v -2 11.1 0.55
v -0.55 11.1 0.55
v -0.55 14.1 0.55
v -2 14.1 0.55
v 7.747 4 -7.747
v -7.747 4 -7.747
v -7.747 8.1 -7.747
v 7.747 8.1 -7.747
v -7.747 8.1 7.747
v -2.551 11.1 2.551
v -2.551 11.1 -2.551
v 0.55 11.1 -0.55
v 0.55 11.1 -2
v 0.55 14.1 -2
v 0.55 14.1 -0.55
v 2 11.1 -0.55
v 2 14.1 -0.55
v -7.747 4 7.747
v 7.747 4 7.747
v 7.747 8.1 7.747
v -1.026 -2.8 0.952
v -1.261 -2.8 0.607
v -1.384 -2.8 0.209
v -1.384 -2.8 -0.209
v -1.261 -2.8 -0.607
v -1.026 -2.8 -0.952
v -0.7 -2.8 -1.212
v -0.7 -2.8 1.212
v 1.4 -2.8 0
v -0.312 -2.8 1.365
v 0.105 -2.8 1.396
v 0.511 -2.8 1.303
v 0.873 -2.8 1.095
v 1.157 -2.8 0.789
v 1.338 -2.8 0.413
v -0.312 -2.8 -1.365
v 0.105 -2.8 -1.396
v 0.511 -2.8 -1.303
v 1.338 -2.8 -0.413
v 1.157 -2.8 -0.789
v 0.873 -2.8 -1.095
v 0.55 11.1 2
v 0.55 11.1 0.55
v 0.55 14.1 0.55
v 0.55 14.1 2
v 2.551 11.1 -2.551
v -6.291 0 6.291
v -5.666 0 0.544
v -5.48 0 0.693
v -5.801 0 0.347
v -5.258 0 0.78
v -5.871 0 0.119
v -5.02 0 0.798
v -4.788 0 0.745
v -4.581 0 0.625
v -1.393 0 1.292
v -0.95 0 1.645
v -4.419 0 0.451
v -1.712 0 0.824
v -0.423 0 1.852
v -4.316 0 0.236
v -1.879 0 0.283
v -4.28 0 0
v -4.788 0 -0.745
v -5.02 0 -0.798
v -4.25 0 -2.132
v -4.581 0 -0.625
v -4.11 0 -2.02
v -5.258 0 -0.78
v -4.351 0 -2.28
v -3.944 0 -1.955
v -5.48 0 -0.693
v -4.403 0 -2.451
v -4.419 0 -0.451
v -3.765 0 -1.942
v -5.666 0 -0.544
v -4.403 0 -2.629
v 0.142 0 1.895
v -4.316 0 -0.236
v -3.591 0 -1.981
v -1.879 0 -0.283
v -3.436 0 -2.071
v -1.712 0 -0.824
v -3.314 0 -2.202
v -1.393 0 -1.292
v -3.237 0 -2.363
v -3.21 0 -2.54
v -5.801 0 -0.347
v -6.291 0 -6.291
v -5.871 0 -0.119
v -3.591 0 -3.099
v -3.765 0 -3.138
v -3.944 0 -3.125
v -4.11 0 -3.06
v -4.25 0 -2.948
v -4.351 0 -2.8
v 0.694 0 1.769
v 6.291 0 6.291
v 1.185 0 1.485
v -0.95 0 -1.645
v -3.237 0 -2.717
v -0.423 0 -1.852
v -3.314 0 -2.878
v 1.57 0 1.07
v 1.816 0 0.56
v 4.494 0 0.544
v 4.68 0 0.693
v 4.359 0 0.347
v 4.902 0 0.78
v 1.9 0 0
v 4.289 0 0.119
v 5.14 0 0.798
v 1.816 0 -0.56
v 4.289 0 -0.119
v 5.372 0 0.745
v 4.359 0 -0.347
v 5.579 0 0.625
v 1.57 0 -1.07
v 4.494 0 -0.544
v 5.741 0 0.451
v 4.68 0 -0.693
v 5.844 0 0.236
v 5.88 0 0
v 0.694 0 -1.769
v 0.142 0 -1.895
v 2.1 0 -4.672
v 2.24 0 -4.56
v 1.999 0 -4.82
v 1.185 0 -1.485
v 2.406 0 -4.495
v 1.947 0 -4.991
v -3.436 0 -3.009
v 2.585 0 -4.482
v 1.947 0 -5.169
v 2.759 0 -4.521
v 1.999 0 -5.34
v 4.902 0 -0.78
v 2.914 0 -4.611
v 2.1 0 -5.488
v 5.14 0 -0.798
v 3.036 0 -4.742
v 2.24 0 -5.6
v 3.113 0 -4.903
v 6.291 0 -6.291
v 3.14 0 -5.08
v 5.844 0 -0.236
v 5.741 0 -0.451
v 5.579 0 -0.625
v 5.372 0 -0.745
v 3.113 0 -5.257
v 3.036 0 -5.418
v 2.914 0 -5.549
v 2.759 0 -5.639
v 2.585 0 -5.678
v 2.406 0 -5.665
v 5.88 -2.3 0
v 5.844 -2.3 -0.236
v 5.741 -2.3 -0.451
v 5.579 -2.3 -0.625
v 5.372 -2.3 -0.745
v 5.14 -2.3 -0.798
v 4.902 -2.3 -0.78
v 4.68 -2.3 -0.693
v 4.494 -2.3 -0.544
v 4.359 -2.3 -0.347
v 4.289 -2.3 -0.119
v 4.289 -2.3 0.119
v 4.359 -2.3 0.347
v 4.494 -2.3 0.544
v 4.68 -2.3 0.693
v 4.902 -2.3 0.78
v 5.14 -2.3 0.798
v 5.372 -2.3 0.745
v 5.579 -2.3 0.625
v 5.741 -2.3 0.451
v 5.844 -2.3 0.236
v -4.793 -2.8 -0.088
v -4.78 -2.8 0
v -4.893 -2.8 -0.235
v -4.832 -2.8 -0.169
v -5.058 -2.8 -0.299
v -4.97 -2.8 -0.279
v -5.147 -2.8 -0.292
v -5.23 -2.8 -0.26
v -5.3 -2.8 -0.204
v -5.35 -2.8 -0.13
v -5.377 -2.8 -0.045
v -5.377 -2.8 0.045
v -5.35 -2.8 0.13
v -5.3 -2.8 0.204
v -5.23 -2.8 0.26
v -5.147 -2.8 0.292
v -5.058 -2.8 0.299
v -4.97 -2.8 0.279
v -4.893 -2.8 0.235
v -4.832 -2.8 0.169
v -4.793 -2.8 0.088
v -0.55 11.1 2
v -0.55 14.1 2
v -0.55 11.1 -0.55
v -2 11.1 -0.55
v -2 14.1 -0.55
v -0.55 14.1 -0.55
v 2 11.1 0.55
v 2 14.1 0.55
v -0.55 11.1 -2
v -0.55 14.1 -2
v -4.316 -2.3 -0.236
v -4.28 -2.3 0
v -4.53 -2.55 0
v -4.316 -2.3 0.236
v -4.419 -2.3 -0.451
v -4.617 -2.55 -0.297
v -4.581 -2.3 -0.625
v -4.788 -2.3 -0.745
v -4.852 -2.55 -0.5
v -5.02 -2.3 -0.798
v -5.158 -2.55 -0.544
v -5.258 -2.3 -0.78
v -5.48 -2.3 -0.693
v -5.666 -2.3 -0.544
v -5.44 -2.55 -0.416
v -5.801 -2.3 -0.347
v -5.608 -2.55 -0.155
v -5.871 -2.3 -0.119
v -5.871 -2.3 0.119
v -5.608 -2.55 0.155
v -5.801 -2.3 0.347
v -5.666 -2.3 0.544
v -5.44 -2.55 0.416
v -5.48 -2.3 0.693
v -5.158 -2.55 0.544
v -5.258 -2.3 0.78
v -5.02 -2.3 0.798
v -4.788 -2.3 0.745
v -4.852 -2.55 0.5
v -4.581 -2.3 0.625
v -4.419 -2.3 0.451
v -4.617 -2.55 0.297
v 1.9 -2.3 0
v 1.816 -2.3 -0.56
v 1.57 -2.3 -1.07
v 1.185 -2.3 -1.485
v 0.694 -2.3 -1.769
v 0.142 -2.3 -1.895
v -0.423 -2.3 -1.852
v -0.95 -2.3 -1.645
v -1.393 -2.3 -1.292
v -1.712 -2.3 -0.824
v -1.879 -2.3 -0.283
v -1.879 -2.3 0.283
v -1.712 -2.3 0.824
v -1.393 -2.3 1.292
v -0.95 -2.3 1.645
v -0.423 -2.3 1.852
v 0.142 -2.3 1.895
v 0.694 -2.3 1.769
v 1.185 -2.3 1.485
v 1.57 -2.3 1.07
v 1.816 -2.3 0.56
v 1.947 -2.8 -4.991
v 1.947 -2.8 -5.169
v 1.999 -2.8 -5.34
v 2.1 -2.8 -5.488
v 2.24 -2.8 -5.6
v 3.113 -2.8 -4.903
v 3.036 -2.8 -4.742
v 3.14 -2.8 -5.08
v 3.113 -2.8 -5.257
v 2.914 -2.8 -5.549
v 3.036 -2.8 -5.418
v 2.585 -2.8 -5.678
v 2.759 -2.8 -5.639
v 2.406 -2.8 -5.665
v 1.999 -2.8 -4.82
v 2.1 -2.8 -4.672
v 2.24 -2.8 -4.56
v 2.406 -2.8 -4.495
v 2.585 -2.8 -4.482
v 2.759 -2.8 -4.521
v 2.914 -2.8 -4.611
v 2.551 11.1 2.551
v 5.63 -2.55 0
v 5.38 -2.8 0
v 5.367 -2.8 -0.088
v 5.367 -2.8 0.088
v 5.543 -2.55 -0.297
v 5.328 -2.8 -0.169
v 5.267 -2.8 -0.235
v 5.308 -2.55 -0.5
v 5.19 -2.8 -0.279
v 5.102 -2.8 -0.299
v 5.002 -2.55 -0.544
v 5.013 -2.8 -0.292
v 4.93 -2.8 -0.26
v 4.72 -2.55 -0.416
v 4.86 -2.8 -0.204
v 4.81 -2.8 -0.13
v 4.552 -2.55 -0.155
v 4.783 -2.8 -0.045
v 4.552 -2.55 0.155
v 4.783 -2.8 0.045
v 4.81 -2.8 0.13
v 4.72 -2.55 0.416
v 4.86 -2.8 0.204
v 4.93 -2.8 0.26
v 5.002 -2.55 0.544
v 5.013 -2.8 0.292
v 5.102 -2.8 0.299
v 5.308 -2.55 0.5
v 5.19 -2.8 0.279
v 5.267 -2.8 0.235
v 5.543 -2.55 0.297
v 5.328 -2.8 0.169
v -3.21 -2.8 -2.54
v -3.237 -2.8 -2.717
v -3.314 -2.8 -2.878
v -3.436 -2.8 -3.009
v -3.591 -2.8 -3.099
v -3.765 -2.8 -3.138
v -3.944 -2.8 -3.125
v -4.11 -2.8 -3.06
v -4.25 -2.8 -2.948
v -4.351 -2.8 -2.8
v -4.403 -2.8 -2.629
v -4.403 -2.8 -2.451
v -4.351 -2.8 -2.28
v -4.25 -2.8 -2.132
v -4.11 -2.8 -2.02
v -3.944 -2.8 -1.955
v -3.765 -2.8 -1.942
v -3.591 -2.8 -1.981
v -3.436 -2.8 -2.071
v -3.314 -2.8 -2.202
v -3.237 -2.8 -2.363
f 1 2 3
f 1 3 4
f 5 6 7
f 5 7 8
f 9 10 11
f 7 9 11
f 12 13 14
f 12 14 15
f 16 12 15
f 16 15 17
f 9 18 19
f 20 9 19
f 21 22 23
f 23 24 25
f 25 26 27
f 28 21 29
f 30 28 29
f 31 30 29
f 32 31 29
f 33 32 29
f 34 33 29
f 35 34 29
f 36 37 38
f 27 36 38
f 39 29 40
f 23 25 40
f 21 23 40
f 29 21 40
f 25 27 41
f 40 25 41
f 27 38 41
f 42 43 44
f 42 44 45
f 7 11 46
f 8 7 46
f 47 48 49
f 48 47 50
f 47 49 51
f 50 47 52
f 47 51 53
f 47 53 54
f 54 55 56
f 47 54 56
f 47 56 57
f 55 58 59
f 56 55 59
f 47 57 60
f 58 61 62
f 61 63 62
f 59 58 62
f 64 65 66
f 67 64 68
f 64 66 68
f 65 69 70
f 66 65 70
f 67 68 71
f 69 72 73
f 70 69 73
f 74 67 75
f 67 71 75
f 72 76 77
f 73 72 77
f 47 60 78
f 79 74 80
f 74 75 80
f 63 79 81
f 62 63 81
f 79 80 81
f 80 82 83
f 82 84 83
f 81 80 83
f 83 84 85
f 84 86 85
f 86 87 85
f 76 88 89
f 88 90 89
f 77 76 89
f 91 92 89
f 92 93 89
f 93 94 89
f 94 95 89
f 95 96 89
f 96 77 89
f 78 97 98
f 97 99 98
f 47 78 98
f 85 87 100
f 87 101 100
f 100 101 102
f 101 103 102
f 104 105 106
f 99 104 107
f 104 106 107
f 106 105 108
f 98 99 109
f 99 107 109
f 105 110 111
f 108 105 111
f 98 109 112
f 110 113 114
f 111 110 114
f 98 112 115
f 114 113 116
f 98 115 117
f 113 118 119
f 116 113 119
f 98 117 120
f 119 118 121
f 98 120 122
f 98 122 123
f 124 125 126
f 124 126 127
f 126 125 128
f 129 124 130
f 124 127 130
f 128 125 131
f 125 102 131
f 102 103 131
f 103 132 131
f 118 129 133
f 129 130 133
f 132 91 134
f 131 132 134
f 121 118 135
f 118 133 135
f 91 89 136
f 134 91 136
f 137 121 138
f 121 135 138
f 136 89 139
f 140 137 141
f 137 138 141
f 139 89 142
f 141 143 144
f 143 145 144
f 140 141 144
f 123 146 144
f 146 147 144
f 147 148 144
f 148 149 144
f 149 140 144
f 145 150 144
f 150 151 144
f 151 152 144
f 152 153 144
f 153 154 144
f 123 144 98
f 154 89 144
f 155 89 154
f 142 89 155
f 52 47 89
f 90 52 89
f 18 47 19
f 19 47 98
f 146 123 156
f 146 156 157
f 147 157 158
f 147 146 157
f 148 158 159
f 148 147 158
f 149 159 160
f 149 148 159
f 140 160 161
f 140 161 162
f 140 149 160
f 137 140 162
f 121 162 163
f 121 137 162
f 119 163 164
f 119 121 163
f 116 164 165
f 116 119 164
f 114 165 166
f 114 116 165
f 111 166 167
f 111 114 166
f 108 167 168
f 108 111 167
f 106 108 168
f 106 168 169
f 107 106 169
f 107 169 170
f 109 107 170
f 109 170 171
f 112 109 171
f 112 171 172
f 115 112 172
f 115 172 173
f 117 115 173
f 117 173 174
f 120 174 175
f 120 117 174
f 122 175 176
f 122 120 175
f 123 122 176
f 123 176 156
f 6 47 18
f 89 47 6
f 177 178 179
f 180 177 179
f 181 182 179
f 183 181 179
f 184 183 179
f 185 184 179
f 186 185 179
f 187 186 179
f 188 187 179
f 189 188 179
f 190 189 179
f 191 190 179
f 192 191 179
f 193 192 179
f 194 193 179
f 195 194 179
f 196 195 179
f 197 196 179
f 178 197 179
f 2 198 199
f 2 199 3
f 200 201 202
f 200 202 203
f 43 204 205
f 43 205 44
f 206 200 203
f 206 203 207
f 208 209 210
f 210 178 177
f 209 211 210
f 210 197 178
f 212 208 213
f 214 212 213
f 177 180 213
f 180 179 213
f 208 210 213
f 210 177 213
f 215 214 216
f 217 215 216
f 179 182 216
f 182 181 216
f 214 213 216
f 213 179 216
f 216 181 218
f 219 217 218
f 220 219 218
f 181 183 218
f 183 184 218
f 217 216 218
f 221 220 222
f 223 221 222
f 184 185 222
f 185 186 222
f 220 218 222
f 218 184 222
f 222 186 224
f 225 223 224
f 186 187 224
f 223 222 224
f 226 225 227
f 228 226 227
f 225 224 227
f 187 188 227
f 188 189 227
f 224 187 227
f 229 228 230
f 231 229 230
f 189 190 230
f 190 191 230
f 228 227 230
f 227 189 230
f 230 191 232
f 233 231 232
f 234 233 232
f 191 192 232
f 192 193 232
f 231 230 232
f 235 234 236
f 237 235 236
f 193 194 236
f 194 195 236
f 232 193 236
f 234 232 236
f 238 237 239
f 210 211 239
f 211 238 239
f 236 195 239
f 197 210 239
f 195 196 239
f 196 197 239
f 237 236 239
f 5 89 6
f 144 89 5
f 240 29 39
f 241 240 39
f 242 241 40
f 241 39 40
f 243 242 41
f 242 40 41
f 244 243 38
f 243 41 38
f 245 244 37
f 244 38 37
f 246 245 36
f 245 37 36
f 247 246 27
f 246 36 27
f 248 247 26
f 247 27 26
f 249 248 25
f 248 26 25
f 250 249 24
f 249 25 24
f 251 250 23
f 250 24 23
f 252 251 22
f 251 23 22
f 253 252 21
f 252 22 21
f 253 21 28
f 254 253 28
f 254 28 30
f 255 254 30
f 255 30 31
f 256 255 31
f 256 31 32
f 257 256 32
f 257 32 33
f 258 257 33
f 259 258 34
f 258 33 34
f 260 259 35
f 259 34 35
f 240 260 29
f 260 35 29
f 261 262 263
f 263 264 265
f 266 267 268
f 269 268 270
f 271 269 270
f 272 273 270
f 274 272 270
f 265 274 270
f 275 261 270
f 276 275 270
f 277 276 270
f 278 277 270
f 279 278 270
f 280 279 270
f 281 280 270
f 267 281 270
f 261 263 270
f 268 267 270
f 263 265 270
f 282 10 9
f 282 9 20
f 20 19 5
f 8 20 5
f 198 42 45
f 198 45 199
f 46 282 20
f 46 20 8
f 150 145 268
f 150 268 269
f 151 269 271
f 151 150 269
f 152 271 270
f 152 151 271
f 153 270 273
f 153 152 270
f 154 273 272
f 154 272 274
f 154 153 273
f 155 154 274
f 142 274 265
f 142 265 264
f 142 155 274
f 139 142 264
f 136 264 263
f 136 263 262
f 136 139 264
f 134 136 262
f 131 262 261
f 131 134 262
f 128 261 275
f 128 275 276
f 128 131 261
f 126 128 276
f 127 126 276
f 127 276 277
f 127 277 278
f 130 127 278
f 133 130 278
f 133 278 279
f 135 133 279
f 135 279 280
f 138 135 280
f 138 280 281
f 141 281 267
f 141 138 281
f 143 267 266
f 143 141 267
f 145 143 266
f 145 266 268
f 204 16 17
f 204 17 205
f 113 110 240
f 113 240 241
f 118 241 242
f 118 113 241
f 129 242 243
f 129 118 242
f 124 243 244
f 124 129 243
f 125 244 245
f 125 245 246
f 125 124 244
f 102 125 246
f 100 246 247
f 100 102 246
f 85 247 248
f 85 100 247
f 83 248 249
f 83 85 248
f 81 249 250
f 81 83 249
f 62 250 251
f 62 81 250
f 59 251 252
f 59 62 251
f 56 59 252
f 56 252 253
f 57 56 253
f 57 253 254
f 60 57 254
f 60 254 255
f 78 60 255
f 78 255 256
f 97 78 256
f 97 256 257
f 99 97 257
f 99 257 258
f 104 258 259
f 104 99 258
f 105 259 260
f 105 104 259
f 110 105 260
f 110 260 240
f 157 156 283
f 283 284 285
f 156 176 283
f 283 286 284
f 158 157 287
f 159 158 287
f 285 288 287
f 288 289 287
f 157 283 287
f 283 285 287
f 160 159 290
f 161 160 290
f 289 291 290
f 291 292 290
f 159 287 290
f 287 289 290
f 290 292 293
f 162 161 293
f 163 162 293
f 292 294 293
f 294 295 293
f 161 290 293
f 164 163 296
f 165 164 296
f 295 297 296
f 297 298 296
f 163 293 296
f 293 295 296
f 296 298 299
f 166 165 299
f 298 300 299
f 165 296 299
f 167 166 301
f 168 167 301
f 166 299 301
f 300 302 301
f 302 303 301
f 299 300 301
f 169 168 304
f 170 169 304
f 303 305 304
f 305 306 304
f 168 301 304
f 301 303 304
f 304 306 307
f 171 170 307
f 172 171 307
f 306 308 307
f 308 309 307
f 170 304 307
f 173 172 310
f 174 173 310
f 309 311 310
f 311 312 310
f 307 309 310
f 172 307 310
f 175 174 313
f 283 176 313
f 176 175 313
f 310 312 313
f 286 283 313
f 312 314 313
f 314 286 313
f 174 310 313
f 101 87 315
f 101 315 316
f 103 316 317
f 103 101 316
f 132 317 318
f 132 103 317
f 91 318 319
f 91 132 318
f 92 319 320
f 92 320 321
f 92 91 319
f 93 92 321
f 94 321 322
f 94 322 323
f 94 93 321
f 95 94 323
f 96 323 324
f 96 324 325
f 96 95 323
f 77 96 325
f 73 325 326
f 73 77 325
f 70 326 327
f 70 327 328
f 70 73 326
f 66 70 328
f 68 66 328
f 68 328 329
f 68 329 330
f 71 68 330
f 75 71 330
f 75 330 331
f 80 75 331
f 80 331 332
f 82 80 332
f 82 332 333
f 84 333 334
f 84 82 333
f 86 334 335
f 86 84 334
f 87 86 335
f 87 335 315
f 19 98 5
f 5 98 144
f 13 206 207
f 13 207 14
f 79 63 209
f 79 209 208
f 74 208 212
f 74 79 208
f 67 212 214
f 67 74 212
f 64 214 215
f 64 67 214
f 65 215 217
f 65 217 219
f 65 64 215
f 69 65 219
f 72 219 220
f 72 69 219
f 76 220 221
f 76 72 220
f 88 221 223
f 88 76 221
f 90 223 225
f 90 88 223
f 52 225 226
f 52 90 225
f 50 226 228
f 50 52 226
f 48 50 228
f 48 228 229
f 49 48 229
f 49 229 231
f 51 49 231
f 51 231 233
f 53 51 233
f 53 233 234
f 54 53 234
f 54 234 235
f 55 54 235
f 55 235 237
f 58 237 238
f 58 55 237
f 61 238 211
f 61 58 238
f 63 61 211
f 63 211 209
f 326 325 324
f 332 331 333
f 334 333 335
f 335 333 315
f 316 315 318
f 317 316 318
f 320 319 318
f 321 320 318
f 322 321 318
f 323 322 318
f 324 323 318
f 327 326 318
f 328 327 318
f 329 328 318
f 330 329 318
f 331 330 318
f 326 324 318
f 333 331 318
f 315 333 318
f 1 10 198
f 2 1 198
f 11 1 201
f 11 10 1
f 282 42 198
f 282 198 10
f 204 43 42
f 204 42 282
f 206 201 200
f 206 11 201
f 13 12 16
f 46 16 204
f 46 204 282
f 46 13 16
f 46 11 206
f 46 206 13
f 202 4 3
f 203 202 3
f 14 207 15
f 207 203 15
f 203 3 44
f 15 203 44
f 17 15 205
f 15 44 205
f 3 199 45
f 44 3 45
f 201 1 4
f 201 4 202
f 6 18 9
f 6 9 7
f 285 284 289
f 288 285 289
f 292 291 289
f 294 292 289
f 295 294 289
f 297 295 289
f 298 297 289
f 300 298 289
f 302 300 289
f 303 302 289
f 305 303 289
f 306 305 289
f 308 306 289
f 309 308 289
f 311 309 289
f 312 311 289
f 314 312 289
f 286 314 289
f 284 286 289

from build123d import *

# Parameters (mm, degrees)
SKETCH1_R             = 1.9
BOSS_EXTRUDE1_DEPTH   = 2.8
SKETCH1_R_2           = 0.8
BOSS_EXTRUDE1_2_DEPTH = 2.8
BOSS_EXTRUDE1_3_DEPTH = 2.8
SKETCH1_R_3           = 0.6
BOSS_EXTRUDE1_4_DEPTH = 2.8
BOSS_EXTRUDE1_5_DEPTH = 2.8
SKETCH2_W             = 15.494
SKETCH2_H             = 15.494
BOSS_EXTRUDE2_DEPTH   = 11.1
BOSS_EXTRUDE3_DEPTH   = 3
CHAMFER1_SIZE         = 3
CHAMFER1_SIZE2        = 5.196152423
CHAMFER1_PART_2_SIZE  = 3
CHAMFER1_PART_2_SIZE2 = 5.196152423
CHAMFER1_PART_3_SIZE  = 3
CHAMFER1_PART_3_SIZE2 = 5.196152423
CHAMFER1_PART_4_SIZE  = 3
CHAMFER1_PART_4_SIZE2 = 5.196152423
CHAMFER2_SIZE         = 4
CHAMFER2_SIZE2        = 1.455880937
CHAMFER2_PART_2_SIZE  = 4
CHAMFER2_PART_2_SIZE2 = 1.455880937
CHAMFER2_PART_3_SIZE  = 4
CHAMFER2_PART_3_SIZE2 = 1.455880937
CHAMFER2_PART_4_SIZE  = 4
CHAMFER2_PART_4_SIZE2 = 1.455880937
CHAMFER3_SIZE         = 0.5


with BuildPart() as part:
    # Sketch1 → Boss-Extrude1 (new body)
    with BuildSketch(Plane(origin=(0, 0, 0), x_dir=(1, 0, 0), z_dir=(0, 1, 0))):
        Circle(SKETCH1_R)
    extrude(amount=-BOSS_EXTRUDE1_DEPTH)



with BuildPart() as body_2:
    # Sketch1 → Boss-Extrude1 2 (new body)
    with BuildSketch(Plane(origin=(0, 0, 0), x_dir=(1, 0, 0), z_dir=(0, 1, 0))):
        with Locations((5.08, 0)):
            Circle(SKETCH1_R_2)
    extrude(amount=-BOSS_EXTRUDE1_2_DEPTH)


with BuildPart() as body_3:
    # Sketch1 → Boss-Extrude1 3 (new body)
    with BuildSketch(Plane(origin=(0, 0, 0), x_dir=(1, 0, 0), z_dir=(0, 1, 0))):
        with Locations((-5.08, 0)):
            Circle(SKETCH1_R_2)
    extrude(amount=-BOSS_EXTRUDE1_3_DEPTH)


with BuildPart() as body_4:
    # Sketch1 → Boss-Extrude1 4 (new body)
    with BuildSketch(Plane(origin=(0, 0, 0), x_dir=(1, 0, 0), z_dir=(0, 1, 0))):
        with Locations((-3.81, 2.54)):
            Circle(SKETCH1_R_3)
    extrude(amount=-BOSS_EXTRUDE1_4_DEPTH)


with BuildPart() as body_5:
    # Sketch1 → Boss-Extrude1 5 (new body)
    with BuildSketch(Plane(origin=(0, 0, 0), x_dir=(1, 0, 0), z_dir=(0, 1, 0))):
        with Locations((2.54, 5.08)):
            Circle(SKETCH1_R_3)
    extrude(amount=-BOSS_EXTRUDE1_5_DEPTH)


with BuildPart() as part_1:
    add(part.part)

    add(body_2.part)  # Boss-Extrude2 merges body 2

    add(body_3.part)  # Boss-Extrude2 merges body 3

    add(body_4.part)  # Boss-Extrude2 merges body 4

    add(body_5.part)  # Boss-Extrude2 merges body 5
    # Sketch2 → Boss-Extrude2 (add)
    with BuildSketch(Plane(origin=(0, 0, 0), x_dir=(1, 0, 0), z_dir=(0, 1, 0))):
        Rectangle(SKETCH2_W, SKETCH2_H)
    extrude(amount=BOSS_EXTRUDE2_DEPTH)

    # Sketch3 → Boss-Extrude3 (add)
    with BuildSketch(Plane(origin=(0, 11.1, 0), x_dir=(-1, 0, 0), z_dir=(0, 1, 0))):
        Polygon((0.55, -2), (-0.55, -2), (-0.55, -0.55), (-2, -0.55), (-2, 0.55), (-0.55, 0.55), (-0.55, 2), (0.55, 2), (0.55, 0.55), (2, 0.55), (2, -0.55), (0.55, -0.55), align=None)
    extrude(amount=BOSS_EXTRUDE3_DEPTH)

    # Chamfer1
    chamfer1_edges = [part_1.edges().sort_by_distance(p)[0] for p in [
        (-7.747, 11.1, 0),
    ]]
    chamfer1_side = [part_1.faces().sort_by_distance(p)[0] for p in [
        (-7.747, 5.55, 0),
    ]]
    chamfer(chamfer1_edges, length=CHAMFER1_SIZE, length2=CHAMFER1_SIZE2, reference=chamfer1_side[0])

    # Chamfer1 part 2
    chamfer1_part_2_edges = [part_1.edges().sort_by_distance(p)[0] for p in [
        (0, 11.1, 7.747),
    ]]
    chamfer1_part_2_side = [part_1.faces().sort_by_distance(p)[0] for p in [
        (0, 5.55, 7.747),
    ]]
    chamfer(chamfer1_part_2_edges, length=CHAMFER1_PART_2_SIZE, length2=CHAMFER1_PART_2_SIZE2, reference=chamfer1_part_2_side[0])

    # Chamfer1 part 3
    chamfer1_part_3_edges = [part_1.edges().sort_by_distance(p)[0] for p in [
        (7.747, 11.1, 0),
    ]]
    chamfer1_part_3_side = [part_1.faces().sort_by_distance(p)[0] for p in [
        (7.747, 5.55, 0),
    ]]
    chamfer(chamfer1_part_3_edges, length=CHAMFER1_PART_3_SIZE, length2=CHAMFER1_PART_3_SIZE2, reference=chamfer1_part_3_side[0])

    # Chamfer1 part 4
    chamfer1_part_4_edges = [part_1.edges().sort_by_distance(p)[0] for p in [
        (0, 11.1, -7.747),
    ]]
    chamfer1_part_4_side = [part_1.faces().sort_by_distance(p)[0] for p in [
        (0, 5.55, -7.747),
    ]]
    chamfer(chamfer1_part_4_edges, length=CHAMFER1_PART_4_SIZE, length2=CHAMFER1_PART_4_SIZE2, reference=chamfer1_part_4_side[0])

    # Chamfer2
    chamfer2_edges = [part_1.edges().sort_by_distance(p)[0] for p in [
        (-7.747, 0, 0),
    ]]
    chamfer2_side = [part_1.faces().sort_by_distance(p)[0] for p in [
        (-7.747, 4.05, 0),
    ]]
    chamfer(chamfer2_edges, length=CHAMFER2_SIZE, length2=CHAMFER2_SIZE2, reference=chamfer2_side[0])

    # Chamfer2 part 2
    chamfer2_part_2_edges = [part_1.edges().sort_by_distance(p)[0] for p in [
        (0, 0, 7.747),
    ]]
    chamfer2_part_2_side = [part_1.faces().sort_by_distance(p)[0] for p in [
        (0, 4.05, 7.747),
    ]]
    chamfer(chamfer2_part_2_edges, length=CHAMFER2_PART_2_SIZE, length2=CHAMFER2_PART_2_SIZE2, reference=chamfer2_part_2_side[0])

    # Chamfer2 part 3
    chamfer2_part_3_edges = [part_1.edges().sort_by_distance(p)[0] for p in [
        (7.747, 0, 0),
    ]]
    chamfer2_part_3_side = [part_1.faces().sort_by_distance(p)[0] for p in [
        (7.747, 4.05, 0),
    ]]
    chamfer(chamfer2_part_3_edges, length=CHAMFER2_PART_3_SIZE, length2=CHAMFER2_PART_3_SIZE2, reference=chamfer2_part_3_side[0])

    # Chamfer2 part 4
    chamfer2_part_4_edges = [part_1.edges().sort_by_distance(p)[0] for p in [
        (0, 0, -7.747),
    ]]
    chamfer2_part_4_side = [part_1.faces().sort_by_distance(p)[0] for p in [
        (0, 4.05, -7.747),
    ]]
    chamfer(chamfer2_part_4_edges, length=CHAMFER2_PART_4_SIZE, length2=CHAMFER2_PART_4_SIZE2, reference=chamfer2_part_4_side[0])

    # Chamfer3
    chamfer3_edges = [part_1.edges().sort_by_distance(p)[0] for p in [
        (4.28, -2.8, 0),
        (-5.88, -2.8, 0),
        (-1.9, -2.8, 0),
    ]]
    chamfer(chamfer3_edges, length=CHAMFER3_SIZE)


solid = part_1.part
